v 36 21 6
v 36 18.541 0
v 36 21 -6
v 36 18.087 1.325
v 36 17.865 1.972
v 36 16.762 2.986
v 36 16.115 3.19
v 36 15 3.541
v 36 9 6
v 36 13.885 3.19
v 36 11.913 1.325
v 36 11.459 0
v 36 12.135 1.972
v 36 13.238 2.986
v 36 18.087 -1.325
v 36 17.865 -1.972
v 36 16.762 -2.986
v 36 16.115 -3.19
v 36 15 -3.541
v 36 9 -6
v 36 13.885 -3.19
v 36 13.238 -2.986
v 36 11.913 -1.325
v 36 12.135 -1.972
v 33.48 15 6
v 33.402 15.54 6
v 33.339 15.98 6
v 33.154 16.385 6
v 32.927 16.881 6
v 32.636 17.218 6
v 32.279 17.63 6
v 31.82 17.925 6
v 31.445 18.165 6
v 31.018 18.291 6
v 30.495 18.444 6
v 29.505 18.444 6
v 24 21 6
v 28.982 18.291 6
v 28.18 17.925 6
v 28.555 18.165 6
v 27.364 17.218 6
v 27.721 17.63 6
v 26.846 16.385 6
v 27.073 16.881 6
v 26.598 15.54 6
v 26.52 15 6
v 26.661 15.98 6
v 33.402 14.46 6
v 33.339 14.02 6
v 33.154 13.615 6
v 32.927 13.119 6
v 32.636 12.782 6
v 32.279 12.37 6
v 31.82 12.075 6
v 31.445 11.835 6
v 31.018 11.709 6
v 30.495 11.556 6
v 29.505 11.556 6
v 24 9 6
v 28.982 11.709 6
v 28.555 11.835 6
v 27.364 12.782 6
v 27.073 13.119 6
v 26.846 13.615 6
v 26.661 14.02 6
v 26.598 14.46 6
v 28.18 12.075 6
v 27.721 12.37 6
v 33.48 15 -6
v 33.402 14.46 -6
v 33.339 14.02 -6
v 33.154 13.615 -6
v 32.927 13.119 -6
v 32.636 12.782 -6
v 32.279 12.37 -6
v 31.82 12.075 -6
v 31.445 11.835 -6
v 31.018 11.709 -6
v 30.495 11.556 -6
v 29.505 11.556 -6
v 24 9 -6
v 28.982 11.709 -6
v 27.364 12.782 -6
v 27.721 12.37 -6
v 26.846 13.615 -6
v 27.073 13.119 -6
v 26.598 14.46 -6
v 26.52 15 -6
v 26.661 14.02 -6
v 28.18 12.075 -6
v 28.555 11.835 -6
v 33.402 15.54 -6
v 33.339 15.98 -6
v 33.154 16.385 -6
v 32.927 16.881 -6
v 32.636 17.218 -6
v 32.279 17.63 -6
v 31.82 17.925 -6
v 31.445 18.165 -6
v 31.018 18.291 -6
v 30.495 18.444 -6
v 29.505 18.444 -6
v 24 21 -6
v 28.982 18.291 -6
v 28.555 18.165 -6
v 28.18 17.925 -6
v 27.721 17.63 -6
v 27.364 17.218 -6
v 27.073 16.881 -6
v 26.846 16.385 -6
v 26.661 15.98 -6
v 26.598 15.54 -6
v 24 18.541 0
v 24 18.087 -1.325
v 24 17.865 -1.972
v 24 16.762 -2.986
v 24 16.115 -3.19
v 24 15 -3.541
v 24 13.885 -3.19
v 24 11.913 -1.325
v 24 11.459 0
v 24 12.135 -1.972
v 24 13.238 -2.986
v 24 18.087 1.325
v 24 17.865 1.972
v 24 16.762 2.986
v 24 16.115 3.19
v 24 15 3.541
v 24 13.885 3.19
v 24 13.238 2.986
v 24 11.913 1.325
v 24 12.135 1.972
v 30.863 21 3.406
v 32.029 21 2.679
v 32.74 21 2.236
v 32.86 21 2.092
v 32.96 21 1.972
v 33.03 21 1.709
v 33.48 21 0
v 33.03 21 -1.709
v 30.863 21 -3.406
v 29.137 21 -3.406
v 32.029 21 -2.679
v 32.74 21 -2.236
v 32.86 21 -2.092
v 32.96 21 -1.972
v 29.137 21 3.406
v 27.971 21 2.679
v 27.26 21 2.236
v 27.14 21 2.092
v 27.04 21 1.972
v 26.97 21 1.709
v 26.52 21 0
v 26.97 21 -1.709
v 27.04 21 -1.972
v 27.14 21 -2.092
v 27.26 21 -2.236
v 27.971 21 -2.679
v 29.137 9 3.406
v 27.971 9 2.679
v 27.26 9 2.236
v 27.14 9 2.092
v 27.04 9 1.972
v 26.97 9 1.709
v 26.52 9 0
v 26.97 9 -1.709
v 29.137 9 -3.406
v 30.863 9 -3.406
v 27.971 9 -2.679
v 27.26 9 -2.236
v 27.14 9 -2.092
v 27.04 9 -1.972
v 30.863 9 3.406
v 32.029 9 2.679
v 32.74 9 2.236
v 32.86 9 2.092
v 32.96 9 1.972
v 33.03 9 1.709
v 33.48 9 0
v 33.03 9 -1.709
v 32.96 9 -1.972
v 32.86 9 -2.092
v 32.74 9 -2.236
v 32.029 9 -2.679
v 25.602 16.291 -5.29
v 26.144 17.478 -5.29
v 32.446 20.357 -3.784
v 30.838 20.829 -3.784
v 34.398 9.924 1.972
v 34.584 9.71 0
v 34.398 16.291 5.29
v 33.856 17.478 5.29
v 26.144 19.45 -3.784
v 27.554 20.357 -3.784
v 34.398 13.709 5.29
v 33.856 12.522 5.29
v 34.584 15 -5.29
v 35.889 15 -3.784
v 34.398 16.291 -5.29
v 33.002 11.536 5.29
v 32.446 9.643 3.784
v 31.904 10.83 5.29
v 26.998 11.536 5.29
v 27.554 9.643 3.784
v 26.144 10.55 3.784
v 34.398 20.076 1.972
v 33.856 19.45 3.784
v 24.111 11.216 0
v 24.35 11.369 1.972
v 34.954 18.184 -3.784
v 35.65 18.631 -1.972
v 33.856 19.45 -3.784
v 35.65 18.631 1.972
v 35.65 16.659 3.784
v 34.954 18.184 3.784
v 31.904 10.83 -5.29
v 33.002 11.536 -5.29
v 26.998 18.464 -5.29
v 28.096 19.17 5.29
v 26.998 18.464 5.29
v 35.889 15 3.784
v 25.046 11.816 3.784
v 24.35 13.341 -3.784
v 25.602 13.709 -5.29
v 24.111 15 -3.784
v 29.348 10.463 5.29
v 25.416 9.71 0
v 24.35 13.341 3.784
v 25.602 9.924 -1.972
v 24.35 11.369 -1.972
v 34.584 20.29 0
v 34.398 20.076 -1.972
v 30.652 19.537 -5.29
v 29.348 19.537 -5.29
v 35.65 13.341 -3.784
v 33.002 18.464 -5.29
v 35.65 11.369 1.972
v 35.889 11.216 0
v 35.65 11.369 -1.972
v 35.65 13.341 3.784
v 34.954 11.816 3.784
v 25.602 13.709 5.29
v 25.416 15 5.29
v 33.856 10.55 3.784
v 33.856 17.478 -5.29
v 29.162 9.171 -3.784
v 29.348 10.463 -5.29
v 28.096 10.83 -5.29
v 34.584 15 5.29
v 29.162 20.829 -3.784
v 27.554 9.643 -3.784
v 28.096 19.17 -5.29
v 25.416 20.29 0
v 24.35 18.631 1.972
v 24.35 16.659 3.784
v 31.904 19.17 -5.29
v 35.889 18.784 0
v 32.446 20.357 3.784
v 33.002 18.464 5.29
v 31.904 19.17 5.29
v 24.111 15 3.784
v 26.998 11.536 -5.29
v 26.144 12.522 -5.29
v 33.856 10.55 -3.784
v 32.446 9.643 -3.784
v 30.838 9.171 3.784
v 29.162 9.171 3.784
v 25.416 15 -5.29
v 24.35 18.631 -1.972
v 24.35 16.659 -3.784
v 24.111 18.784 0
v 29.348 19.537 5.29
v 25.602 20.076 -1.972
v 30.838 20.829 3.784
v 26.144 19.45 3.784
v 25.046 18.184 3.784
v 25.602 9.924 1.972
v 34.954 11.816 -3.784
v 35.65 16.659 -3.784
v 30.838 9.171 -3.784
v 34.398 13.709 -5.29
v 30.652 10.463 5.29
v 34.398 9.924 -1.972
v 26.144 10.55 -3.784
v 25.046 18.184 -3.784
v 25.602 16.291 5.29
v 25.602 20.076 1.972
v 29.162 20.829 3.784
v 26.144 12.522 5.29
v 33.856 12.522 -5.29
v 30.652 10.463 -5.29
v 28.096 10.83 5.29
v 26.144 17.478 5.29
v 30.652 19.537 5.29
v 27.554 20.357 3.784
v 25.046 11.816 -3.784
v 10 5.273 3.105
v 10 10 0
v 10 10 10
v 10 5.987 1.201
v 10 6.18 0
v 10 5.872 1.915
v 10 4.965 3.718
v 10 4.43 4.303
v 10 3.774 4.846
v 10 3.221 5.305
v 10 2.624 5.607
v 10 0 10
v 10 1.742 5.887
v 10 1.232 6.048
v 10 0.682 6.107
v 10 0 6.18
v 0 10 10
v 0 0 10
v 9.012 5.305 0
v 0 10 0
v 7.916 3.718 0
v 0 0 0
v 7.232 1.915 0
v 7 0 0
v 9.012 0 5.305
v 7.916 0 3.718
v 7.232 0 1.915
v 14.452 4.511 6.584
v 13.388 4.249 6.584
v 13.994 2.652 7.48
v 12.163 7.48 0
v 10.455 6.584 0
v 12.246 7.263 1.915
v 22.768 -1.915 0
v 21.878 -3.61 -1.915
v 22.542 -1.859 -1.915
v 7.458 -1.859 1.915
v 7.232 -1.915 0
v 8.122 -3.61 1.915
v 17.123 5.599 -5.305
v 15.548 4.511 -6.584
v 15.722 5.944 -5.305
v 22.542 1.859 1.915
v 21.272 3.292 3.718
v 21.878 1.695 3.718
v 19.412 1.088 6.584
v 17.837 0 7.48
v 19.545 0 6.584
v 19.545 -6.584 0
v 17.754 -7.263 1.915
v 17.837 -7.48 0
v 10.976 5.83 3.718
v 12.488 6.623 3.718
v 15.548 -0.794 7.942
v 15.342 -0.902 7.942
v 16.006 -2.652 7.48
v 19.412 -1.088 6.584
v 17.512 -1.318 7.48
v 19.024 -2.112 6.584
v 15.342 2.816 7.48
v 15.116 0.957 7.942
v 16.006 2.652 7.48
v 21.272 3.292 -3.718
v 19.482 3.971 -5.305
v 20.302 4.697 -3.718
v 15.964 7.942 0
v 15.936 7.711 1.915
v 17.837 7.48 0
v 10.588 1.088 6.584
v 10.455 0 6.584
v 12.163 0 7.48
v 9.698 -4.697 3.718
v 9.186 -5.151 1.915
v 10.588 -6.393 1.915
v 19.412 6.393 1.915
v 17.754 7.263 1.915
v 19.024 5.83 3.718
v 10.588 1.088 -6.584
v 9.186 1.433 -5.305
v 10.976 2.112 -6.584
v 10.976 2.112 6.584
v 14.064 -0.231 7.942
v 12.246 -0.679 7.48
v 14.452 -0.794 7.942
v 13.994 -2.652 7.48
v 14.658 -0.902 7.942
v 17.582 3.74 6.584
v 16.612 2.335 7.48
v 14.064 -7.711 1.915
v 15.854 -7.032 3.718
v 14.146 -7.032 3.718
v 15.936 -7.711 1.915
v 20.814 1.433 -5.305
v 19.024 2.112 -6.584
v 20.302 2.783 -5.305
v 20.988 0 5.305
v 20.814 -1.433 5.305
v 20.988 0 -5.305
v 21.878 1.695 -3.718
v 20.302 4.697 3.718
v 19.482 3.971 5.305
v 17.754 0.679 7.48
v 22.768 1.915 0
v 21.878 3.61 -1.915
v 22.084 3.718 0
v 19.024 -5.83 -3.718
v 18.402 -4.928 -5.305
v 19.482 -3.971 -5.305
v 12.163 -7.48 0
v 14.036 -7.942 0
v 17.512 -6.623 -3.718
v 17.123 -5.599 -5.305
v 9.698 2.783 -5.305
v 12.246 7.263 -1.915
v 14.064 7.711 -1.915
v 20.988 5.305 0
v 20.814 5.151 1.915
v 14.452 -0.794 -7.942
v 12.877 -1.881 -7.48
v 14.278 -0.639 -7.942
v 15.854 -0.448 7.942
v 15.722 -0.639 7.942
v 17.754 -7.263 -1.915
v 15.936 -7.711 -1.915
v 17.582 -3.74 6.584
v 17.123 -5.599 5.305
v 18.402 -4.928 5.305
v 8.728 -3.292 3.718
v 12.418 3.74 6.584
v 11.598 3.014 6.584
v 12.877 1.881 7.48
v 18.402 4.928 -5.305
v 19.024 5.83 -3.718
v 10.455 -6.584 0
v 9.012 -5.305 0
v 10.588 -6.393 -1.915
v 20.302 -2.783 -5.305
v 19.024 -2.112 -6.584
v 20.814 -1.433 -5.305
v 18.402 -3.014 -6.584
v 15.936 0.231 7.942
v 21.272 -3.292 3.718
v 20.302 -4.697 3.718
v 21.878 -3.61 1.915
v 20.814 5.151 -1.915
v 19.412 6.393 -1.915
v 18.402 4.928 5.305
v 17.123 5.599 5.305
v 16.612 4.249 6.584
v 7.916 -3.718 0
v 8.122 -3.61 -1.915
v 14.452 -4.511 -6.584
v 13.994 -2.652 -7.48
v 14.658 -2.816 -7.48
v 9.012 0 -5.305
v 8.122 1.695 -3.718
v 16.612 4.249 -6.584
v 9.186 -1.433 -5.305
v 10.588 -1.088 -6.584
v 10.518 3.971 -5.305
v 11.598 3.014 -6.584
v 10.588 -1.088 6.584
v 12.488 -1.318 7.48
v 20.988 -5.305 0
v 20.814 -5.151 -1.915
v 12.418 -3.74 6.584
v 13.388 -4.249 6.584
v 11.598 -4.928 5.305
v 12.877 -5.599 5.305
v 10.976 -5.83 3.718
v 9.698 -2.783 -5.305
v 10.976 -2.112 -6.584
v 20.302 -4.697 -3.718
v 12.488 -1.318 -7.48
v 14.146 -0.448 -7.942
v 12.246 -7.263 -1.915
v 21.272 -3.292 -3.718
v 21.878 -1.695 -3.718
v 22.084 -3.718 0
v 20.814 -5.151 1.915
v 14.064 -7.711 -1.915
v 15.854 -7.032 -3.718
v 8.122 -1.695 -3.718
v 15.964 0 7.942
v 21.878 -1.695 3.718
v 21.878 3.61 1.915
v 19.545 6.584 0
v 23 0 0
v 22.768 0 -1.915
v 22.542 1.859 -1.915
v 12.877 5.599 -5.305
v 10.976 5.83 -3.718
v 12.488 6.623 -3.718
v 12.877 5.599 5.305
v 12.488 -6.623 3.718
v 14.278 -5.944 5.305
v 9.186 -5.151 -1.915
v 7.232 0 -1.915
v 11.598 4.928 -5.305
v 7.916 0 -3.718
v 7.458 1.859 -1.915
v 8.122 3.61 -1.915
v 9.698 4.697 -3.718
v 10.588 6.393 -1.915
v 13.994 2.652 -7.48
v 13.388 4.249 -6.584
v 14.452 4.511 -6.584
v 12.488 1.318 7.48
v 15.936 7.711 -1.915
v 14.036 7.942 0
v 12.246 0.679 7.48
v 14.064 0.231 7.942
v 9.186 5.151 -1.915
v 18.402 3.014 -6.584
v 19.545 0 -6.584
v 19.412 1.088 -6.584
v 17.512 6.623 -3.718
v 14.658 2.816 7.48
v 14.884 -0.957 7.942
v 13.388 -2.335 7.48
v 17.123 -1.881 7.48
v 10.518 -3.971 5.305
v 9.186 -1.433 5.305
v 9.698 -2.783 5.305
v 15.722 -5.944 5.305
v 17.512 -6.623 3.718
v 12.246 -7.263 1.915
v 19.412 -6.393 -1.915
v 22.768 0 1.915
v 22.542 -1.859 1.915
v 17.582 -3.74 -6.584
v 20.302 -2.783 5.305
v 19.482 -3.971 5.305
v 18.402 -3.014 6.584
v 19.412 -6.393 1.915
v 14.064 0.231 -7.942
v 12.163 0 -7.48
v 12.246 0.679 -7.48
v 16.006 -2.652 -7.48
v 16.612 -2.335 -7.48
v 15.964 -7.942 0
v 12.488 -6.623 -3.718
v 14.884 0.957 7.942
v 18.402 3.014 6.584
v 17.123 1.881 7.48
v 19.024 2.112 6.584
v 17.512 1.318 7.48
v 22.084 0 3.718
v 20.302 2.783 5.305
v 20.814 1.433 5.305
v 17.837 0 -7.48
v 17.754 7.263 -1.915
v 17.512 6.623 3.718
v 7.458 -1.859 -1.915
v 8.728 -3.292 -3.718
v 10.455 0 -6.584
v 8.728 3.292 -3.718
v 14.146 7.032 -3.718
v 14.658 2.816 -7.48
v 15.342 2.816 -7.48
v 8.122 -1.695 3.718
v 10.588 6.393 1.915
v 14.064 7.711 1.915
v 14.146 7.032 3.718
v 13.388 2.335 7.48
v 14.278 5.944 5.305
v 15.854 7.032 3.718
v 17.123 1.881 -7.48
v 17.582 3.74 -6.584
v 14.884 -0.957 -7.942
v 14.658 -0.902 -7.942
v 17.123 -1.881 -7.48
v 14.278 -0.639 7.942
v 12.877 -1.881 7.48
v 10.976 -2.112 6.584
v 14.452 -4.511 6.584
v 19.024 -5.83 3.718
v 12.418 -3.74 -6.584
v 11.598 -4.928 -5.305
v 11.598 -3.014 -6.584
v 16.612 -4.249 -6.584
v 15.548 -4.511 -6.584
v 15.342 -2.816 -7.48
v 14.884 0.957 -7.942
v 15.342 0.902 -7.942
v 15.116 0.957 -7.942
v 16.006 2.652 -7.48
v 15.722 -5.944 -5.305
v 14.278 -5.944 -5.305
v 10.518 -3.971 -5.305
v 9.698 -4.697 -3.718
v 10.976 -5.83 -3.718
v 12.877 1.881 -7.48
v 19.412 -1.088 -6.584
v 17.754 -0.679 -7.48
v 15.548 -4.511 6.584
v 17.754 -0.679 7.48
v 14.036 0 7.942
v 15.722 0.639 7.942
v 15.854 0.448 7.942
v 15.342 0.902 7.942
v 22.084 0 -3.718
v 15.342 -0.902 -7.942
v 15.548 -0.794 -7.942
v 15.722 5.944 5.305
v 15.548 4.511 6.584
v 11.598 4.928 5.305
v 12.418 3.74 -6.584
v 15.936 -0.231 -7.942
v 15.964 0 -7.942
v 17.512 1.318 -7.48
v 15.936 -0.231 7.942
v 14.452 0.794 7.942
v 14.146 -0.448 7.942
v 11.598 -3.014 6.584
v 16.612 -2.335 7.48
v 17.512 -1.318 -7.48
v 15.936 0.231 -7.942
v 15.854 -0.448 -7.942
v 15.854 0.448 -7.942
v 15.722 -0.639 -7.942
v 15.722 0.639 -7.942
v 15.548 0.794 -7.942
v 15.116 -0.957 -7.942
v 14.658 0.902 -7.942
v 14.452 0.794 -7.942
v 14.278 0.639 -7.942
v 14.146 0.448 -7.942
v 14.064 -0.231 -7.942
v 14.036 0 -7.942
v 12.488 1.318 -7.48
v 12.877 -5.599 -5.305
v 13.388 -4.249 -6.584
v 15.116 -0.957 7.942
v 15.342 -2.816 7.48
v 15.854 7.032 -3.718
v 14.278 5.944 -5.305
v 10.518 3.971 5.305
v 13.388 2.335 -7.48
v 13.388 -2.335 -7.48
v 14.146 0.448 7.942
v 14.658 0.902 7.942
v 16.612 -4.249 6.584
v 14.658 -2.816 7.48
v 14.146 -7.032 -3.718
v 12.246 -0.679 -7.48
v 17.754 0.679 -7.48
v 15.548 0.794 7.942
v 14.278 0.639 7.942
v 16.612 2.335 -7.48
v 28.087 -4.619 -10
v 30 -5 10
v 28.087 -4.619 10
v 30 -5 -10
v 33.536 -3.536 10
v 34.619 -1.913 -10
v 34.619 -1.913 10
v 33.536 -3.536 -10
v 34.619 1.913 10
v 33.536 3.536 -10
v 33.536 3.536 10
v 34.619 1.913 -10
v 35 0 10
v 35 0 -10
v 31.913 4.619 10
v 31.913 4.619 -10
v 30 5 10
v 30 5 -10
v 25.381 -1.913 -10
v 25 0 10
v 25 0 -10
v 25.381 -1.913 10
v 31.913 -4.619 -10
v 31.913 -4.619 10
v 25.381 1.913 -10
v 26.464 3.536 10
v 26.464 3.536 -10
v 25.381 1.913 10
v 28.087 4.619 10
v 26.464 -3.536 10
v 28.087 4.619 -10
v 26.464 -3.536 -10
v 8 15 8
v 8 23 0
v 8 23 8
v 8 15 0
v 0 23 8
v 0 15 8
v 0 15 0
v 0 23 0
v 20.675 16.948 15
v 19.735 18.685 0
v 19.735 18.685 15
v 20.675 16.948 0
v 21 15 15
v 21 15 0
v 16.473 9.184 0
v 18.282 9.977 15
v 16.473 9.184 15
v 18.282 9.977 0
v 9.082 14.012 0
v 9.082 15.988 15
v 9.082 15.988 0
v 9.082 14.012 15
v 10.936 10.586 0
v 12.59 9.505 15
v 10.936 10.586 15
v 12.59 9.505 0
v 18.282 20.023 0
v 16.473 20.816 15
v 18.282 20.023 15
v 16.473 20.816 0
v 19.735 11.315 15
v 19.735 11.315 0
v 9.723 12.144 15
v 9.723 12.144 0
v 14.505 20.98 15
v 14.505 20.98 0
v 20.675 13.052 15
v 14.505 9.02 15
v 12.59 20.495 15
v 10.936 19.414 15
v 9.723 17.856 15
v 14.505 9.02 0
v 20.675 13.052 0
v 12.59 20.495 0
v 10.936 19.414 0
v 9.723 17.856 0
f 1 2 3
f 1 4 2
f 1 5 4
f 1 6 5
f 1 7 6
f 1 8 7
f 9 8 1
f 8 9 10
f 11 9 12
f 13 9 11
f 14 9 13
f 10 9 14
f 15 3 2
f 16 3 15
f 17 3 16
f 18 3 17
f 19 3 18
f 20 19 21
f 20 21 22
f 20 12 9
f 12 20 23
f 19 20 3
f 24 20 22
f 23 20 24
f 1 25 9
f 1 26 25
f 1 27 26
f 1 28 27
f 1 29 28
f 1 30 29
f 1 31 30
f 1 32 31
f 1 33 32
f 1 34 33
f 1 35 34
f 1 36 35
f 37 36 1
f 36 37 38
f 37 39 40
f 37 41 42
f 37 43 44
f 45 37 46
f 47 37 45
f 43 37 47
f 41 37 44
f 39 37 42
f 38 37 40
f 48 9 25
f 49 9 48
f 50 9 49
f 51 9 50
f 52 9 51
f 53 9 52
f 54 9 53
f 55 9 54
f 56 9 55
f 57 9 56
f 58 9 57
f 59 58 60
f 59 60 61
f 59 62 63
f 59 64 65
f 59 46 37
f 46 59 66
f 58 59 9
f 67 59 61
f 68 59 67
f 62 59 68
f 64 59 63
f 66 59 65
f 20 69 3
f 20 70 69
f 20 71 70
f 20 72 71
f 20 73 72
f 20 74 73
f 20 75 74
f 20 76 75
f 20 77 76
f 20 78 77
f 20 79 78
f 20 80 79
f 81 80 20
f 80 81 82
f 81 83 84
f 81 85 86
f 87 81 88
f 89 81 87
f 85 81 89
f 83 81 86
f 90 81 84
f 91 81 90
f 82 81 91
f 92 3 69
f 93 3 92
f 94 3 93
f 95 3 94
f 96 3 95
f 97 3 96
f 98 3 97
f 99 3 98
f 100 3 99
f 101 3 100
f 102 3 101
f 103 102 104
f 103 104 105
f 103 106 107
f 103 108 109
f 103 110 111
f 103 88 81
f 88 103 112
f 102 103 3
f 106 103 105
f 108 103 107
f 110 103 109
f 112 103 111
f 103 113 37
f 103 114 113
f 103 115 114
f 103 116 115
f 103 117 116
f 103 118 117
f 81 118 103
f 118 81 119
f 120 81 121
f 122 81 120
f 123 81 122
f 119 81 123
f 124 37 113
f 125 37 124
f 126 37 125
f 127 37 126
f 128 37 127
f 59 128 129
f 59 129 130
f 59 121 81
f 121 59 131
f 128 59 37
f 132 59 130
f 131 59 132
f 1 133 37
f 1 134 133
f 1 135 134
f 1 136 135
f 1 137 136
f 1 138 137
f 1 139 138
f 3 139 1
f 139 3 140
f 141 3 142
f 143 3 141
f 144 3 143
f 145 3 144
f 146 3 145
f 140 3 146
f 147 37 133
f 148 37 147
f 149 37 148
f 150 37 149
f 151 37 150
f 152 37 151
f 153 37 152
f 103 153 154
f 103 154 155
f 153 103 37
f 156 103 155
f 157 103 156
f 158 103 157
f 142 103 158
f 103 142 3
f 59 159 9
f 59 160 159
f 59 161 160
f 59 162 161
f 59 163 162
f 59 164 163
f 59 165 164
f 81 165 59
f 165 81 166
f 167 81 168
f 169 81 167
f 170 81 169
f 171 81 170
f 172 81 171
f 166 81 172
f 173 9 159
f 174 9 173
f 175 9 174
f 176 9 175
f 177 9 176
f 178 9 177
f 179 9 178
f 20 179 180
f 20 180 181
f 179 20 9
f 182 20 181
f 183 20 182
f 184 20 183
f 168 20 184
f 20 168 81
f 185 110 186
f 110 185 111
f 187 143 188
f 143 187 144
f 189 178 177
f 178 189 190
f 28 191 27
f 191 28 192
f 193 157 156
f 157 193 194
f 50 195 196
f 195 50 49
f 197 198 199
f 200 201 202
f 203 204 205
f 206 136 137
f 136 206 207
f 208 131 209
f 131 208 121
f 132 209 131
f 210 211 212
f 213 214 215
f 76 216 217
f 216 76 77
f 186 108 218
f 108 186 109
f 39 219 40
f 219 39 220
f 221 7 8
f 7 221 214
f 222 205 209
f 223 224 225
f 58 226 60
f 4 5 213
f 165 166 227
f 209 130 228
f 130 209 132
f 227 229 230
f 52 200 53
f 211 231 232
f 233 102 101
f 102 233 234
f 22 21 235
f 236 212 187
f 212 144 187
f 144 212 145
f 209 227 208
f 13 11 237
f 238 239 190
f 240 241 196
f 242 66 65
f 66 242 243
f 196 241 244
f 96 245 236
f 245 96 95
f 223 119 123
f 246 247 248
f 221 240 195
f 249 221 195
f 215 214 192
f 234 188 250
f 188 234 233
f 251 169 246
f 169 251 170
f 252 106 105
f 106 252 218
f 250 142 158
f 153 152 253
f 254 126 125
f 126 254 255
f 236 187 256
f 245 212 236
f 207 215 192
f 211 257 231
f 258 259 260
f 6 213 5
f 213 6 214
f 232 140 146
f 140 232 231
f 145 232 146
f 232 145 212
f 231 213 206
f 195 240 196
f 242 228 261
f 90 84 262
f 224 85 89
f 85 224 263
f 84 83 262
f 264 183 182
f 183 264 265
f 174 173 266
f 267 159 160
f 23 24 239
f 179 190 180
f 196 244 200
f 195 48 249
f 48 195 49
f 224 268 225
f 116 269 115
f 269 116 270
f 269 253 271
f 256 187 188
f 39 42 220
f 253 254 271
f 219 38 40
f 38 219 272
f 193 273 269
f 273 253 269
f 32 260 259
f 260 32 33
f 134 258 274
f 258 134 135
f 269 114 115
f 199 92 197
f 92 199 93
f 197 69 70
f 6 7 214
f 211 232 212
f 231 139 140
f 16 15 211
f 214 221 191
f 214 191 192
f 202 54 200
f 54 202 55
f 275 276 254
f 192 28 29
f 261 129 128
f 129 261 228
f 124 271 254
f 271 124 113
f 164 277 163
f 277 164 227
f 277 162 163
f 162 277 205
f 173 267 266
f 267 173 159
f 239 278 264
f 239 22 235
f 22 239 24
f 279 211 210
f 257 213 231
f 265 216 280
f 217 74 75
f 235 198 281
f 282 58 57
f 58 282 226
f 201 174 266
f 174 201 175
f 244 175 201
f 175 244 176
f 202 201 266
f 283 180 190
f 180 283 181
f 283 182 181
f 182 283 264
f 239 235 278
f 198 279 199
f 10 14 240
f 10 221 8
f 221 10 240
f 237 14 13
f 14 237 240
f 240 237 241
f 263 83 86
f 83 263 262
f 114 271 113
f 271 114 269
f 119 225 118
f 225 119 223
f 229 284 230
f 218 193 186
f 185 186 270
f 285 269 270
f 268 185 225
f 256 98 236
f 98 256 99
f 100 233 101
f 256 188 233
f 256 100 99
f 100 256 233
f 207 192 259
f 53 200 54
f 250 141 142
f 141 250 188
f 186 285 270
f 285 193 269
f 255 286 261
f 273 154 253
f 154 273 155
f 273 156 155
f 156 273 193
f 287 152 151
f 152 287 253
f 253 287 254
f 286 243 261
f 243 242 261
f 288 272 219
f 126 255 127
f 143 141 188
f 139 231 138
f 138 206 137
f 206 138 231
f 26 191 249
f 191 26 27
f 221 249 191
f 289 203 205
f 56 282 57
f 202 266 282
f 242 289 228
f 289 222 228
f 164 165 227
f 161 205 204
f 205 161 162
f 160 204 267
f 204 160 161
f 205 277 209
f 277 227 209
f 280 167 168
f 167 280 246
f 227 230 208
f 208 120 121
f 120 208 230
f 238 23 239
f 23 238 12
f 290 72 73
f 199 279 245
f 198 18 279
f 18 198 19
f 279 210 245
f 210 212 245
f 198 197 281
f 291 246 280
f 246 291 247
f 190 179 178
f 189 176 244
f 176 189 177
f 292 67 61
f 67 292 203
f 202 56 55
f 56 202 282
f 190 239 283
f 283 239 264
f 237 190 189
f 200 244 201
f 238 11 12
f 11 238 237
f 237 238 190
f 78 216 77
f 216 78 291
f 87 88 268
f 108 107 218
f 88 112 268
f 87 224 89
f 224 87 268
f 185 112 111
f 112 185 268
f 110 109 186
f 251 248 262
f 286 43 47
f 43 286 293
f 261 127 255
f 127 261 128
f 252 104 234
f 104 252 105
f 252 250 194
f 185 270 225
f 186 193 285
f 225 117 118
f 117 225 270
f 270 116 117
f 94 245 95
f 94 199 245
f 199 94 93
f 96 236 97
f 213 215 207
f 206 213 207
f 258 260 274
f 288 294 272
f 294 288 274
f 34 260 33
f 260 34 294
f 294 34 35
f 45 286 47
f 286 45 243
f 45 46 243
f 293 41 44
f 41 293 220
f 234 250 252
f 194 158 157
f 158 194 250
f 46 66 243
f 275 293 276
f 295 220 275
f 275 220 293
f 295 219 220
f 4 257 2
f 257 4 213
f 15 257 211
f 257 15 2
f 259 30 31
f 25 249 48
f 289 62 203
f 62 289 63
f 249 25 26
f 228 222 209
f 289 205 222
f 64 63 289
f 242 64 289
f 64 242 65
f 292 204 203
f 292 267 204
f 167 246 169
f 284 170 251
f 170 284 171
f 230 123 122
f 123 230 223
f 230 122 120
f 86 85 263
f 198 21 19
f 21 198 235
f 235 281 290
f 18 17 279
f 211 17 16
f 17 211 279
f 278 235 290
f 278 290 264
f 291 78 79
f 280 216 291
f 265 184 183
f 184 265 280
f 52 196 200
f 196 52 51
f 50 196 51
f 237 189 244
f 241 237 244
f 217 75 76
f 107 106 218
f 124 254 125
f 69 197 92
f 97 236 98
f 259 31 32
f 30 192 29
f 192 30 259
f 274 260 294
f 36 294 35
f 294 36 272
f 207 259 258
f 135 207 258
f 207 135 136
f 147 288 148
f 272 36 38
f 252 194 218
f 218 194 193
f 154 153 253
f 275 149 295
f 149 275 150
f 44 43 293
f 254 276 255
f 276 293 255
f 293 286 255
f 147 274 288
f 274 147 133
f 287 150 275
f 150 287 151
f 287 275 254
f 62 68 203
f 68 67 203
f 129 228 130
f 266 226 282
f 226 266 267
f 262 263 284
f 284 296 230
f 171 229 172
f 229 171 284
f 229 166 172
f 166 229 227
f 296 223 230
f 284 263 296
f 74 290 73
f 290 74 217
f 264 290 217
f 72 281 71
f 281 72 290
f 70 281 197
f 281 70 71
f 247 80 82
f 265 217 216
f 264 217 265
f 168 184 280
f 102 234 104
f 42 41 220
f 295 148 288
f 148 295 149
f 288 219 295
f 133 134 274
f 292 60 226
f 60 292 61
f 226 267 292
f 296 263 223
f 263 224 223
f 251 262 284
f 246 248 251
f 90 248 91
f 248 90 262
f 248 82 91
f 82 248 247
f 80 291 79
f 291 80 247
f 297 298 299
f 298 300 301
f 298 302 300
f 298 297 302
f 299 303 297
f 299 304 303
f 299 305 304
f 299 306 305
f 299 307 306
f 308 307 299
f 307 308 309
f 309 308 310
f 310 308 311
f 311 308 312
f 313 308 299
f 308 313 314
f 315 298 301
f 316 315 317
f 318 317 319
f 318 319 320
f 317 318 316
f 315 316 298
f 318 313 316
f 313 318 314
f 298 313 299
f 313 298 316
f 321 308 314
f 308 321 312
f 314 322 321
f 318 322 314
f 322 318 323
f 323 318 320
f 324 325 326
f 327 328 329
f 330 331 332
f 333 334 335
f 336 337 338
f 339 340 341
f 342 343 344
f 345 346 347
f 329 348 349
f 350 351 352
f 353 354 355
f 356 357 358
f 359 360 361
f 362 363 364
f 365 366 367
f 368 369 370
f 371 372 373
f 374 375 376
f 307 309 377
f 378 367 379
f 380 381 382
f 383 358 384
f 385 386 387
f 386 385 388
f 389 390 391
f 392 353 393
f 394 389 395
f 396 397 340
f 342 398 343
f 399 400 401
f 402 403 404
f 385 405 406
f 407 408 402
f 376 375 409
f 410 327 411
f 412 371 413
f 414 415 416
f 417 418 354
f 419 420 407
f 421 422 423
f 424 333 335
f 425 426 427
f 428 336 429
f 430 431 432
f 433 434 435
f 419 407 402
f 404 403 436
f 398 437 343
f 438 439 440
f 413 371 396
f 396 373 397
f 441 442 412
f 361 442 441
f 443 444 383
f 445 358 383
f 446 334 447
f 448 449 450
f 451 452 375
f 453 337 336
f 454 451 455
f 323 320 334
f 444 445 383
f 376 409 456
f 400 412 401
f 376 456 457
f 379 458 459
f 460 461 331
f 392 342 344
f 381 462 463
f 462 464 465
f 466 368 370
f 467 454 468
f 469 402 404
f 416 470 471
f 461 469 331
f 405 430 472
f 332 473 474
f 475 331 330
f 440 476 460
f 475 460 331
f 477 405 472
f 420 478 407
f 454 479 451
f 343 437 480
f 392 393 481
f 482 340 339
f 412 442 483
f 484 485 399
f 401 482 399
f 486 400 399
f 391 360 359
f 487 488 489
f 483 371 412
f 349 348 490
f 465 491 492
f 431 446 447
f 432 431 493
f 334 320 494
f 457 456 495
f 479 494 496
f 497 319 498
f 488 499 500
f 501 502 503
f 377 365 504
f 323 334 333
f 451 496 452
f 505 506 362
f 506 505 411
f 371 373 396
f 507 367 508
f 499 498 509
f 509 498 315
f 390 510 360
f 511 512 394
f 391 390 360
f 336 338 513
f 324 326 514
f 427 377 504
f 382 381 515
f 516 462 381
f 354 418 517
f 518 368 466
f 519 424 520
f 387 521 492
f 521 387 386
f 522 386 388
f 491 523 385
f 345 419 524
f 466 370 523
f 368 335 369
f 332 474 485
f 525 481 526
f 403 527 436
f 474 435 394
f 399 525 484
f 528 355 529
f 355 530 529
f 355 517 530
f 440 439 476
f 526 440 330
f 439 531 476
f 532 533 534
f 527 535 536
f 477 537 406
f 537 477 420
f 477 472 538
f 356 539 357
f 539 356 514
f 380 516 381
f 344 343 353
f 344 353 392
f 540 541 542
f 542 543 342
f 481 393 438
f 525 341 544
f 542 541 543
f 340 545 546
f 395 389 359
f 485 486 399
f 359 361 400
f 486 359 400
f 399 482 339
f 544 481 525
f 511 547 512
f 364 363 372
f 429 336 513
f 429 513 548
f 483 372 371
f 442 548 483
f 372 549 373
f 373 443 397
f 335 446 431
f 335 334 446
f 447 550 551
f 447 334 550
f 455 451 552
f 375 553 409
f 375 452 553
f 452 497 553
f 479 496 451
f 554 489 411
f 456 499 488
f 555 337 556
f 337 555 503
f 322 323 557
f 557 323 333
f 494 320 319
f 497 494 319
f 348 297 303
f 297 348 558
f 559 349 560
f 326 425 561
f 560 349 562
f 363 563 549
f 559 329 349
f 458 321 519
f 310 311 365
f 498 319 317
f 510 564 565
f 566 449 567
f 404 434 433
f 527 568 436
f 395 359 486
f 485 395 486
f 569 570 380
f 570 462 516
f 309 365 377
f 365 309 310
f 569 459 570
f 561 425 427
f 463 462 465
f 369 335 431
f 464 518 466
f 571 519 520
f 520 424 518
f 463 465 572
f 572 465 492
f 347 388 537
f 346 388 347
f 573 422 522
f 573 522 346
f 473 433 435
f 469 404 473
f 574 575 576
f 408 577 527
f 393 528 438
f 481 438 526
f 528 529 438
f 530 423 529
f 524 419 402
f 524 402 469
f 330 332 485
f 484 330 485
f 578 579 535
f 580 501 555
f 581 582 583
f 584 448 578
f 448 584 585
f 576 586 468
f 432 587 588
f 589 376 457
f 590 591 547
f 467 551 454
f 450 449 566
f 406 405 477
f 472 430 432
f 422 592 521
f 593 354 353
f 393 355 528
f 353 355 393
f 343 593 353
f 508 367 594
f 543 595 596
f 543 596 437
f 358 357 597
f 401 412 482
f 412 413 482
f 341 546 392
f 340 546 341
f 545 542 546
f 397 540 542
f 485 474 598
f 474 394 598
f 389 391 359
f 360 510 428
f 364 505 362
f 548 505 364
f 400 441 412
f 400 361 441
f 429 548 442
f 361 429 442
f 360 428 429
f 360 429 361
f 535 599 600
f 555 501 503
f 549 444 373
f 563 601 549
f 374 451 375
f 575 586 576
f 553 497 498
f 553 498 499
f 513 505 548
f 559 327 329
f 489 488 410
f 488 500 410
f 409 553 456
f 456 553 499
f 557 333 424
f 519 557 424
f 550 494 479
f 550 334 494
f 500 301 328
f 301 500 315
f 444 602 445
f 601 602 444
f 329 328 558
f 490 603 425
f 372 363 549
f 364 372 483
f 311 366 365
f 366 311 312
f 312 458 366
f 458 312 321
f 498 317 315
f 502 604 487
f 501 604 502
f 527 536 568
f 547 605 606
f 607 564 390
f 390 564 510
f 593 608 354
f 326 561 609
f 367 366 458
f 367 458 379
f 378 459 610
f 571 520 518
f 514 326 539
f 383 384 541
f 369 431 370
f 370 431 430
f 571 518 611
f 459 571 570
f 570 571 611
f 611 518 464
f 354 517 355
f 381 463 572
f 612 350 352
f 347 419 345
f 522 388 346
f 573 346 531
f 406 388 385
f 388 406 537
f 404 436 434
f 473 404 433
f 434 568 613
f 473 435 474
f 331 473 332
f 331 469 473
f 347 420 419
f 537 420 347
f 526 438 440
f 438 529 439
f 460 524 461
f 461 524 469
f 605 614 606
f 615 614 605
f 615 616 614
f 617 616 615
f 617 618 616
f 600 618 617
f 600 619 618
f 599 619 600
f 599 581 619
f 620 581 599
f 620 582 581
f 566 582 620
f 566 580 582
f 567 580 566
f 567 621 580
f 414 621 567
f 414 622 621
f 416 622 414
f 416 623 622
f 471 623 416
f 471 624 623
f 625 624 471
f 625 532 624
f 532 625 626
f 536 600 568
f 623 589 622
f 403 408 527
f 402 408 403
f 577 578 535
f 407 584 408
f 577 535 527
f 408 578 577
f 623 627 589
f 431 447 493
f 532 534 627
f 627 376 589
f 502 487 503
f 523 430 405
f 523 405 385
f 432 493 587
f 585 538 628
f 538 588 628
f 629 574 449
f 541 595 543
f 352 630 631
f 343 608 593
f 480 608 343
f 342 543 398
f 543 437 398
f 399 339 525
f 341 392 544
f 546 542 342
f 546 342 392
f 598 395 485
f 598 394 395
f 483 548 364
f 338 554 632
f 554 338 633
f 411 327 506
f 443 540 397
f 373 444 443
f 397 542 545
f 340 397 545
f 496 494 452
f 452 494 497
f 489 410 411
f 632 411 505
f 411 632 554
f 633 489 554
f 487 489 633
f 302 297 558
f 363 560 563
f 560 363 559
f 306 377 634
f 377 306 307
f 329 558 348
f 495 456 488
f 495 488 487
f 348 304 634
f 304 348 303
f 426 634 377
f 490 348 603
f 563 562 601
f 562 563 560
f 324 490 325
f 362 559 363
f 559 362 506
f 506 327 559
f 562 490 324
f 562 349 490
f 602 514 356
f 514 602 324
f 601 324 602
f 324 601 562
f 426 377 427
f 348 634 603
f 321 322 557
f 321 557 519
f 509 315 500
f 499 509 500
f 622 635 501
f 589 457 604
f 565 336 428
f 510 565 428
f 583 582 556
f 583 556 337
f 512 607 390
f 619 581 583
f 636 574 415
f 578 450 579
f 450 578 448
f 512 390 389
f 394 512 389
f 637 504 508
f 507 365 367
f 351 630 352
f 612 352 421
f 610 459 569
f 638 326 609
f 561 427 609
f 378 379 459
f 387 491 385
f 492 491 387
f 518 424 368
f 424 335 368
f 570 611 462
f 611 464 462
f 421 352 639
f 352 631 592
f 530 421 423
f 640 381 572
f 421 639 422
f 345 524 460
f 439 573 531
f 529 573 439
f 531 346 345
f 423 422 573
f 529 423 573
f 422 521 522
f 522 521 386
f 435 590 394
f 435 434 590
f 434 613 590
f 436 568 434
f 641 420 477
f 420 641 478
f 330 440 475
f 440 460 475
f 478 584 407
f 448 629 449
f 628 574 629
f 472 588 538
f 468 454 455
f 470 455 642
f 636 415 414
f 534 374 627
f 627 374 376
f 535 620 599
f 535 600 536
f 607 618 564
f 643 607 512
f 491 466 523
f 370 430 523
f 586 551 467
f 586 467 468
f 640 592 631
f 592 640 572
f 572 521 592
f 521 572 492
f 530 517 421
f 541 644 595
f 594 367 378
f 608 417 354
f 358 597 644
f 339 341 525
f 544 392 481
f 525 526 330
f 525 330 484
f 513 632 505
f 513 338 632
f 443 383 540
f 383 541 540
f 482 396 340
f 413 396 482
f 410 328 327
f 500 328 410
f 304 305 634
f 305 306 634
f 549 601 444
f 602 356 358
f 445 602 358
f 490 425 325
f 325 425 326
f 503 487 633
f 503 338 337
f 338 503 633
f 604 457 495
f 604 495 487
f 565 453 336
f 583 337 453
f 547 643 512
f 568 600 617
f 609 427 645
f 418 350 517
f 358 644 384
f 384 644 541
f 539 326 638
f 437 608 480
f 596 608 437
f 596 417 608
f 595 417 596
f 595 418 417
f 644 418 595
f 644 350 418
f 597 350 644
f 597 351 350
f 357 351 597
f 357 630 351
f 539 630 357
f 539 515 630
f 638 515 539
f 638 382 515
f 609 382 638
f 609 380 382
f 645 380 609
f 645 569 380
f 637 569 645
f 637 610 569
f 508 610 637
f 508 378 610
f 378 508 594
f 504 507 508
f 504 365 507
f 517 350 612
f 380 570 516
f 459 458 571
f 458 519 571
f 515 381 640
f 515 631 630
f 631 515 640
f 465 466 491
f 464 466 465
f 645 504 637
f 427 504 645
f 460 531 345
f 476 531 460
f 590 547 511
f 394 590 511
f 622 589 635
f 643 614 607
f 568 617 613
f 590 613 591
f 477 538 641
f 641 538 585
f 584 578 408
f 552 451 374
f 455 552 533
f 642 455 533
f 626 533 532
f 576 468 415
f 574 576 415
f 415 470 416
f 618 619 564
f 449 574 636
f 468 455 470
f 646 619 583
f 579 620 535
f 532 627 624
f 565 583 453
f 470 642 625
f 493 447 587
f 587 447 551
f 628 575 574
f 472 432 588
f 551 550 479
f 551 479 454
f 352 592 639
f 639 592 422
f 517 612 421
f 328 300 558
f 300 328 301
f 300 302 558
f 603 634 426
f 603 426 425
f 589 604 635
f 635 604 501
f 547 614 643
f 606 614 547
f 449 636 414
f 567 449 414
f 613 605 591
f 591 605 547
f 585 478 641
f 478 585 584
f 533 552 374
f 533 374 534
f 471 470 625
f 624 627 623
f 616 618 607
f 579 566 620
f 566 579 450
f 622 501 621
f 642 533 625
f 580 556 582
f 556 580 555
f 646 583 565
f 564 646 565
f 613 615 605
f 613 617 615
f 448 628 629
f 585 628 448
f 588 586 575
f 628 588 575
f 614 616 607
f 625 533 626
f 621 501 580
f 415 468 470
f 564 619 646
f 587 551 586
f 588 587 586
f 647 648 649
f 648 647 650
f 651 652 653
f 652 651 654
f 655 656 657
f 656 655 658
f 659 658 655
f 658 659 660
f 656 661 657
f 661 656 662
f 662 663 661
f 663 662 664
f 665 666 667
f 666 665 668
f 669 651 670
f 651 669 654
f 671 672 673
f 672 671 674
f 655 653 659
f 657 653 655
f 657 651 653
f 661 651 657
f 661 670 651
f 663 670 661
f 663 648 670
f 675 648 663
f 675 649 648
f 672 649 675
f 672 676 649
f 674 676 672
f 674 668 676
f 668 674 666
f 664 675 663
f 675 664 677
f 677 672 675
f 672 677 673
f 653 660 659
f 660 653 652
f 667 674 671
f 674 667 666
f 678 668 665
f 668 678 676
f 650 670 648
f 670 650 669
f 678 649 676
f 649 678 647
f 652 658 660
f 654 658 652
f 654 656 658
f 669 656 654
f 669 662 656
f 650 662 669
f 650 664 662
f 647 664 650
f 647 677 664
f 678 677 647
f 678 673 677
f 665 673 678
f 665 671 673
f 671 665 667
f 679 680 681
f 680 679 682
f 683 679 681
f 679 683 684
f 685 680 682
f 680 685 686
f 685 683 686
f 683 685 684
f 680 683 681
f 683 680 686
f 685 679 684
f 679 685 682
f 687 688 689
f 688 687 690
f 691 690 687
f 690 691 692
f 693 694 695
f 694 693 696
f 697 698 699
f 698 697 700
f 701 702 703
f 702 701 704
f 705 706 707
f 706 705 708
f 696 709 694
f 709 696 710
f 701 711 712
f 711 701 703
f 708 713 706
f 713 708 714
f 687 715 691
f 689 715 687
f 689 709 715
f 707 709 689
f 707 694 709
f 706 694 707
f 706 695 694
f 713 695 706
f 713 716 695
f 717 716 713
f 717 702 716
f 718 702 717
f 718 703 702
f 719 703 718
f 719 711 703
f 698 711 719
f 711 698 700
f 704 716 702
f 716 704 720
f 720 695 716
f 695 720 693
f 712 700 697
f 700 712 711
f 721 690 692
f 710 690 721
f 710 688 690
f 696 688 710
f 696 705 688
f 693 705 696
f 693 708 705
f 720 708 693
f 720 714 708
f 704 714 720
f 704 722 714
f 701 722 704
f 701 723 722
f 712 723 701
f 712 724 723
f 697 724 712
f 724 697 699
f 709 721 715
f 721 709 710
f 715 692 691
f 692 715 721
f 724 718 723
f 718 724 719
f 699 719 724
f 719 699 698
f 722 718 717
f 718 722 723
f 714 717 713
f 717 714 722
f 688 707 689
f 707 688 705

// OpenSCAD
// Test file for GLB export with colors and transparency

// Solid red cube
color([1, 0, 0])
cube([10, 10, 10]);

// Semi-transparent green sphere
translate([15, 0, 0])
color([0, 1, 0], alpha=0.5)
sphere(r=8);

// Blue cylinder with low alpha
translate([30, 0, 0])
color([0, 0, 1], alpha=0.3)
cylinder(h=20, r=5, center=true);

// Multi-color - yellow to demonstrate color transition
translate([0, 15, 0])
color([1, 1, 0])
cube([8, 8, 8]);

// Transparent cone
translate([15, 15, 0])
color([1, 0, 1], alpha=0.7)
cone(h=15, r=6);

// Mix of colors with difference operation
translate([30, 15, 0])
difference() {
  color([1, 0, 0])
  cube([12, 12, 12], center=true);
  
  color([0, 1, 1], alpha=0.5)
  sphere(r=7);
}

module cone(h, r) {
  linear_extrude(height=h)
  circle(r=r);
}
